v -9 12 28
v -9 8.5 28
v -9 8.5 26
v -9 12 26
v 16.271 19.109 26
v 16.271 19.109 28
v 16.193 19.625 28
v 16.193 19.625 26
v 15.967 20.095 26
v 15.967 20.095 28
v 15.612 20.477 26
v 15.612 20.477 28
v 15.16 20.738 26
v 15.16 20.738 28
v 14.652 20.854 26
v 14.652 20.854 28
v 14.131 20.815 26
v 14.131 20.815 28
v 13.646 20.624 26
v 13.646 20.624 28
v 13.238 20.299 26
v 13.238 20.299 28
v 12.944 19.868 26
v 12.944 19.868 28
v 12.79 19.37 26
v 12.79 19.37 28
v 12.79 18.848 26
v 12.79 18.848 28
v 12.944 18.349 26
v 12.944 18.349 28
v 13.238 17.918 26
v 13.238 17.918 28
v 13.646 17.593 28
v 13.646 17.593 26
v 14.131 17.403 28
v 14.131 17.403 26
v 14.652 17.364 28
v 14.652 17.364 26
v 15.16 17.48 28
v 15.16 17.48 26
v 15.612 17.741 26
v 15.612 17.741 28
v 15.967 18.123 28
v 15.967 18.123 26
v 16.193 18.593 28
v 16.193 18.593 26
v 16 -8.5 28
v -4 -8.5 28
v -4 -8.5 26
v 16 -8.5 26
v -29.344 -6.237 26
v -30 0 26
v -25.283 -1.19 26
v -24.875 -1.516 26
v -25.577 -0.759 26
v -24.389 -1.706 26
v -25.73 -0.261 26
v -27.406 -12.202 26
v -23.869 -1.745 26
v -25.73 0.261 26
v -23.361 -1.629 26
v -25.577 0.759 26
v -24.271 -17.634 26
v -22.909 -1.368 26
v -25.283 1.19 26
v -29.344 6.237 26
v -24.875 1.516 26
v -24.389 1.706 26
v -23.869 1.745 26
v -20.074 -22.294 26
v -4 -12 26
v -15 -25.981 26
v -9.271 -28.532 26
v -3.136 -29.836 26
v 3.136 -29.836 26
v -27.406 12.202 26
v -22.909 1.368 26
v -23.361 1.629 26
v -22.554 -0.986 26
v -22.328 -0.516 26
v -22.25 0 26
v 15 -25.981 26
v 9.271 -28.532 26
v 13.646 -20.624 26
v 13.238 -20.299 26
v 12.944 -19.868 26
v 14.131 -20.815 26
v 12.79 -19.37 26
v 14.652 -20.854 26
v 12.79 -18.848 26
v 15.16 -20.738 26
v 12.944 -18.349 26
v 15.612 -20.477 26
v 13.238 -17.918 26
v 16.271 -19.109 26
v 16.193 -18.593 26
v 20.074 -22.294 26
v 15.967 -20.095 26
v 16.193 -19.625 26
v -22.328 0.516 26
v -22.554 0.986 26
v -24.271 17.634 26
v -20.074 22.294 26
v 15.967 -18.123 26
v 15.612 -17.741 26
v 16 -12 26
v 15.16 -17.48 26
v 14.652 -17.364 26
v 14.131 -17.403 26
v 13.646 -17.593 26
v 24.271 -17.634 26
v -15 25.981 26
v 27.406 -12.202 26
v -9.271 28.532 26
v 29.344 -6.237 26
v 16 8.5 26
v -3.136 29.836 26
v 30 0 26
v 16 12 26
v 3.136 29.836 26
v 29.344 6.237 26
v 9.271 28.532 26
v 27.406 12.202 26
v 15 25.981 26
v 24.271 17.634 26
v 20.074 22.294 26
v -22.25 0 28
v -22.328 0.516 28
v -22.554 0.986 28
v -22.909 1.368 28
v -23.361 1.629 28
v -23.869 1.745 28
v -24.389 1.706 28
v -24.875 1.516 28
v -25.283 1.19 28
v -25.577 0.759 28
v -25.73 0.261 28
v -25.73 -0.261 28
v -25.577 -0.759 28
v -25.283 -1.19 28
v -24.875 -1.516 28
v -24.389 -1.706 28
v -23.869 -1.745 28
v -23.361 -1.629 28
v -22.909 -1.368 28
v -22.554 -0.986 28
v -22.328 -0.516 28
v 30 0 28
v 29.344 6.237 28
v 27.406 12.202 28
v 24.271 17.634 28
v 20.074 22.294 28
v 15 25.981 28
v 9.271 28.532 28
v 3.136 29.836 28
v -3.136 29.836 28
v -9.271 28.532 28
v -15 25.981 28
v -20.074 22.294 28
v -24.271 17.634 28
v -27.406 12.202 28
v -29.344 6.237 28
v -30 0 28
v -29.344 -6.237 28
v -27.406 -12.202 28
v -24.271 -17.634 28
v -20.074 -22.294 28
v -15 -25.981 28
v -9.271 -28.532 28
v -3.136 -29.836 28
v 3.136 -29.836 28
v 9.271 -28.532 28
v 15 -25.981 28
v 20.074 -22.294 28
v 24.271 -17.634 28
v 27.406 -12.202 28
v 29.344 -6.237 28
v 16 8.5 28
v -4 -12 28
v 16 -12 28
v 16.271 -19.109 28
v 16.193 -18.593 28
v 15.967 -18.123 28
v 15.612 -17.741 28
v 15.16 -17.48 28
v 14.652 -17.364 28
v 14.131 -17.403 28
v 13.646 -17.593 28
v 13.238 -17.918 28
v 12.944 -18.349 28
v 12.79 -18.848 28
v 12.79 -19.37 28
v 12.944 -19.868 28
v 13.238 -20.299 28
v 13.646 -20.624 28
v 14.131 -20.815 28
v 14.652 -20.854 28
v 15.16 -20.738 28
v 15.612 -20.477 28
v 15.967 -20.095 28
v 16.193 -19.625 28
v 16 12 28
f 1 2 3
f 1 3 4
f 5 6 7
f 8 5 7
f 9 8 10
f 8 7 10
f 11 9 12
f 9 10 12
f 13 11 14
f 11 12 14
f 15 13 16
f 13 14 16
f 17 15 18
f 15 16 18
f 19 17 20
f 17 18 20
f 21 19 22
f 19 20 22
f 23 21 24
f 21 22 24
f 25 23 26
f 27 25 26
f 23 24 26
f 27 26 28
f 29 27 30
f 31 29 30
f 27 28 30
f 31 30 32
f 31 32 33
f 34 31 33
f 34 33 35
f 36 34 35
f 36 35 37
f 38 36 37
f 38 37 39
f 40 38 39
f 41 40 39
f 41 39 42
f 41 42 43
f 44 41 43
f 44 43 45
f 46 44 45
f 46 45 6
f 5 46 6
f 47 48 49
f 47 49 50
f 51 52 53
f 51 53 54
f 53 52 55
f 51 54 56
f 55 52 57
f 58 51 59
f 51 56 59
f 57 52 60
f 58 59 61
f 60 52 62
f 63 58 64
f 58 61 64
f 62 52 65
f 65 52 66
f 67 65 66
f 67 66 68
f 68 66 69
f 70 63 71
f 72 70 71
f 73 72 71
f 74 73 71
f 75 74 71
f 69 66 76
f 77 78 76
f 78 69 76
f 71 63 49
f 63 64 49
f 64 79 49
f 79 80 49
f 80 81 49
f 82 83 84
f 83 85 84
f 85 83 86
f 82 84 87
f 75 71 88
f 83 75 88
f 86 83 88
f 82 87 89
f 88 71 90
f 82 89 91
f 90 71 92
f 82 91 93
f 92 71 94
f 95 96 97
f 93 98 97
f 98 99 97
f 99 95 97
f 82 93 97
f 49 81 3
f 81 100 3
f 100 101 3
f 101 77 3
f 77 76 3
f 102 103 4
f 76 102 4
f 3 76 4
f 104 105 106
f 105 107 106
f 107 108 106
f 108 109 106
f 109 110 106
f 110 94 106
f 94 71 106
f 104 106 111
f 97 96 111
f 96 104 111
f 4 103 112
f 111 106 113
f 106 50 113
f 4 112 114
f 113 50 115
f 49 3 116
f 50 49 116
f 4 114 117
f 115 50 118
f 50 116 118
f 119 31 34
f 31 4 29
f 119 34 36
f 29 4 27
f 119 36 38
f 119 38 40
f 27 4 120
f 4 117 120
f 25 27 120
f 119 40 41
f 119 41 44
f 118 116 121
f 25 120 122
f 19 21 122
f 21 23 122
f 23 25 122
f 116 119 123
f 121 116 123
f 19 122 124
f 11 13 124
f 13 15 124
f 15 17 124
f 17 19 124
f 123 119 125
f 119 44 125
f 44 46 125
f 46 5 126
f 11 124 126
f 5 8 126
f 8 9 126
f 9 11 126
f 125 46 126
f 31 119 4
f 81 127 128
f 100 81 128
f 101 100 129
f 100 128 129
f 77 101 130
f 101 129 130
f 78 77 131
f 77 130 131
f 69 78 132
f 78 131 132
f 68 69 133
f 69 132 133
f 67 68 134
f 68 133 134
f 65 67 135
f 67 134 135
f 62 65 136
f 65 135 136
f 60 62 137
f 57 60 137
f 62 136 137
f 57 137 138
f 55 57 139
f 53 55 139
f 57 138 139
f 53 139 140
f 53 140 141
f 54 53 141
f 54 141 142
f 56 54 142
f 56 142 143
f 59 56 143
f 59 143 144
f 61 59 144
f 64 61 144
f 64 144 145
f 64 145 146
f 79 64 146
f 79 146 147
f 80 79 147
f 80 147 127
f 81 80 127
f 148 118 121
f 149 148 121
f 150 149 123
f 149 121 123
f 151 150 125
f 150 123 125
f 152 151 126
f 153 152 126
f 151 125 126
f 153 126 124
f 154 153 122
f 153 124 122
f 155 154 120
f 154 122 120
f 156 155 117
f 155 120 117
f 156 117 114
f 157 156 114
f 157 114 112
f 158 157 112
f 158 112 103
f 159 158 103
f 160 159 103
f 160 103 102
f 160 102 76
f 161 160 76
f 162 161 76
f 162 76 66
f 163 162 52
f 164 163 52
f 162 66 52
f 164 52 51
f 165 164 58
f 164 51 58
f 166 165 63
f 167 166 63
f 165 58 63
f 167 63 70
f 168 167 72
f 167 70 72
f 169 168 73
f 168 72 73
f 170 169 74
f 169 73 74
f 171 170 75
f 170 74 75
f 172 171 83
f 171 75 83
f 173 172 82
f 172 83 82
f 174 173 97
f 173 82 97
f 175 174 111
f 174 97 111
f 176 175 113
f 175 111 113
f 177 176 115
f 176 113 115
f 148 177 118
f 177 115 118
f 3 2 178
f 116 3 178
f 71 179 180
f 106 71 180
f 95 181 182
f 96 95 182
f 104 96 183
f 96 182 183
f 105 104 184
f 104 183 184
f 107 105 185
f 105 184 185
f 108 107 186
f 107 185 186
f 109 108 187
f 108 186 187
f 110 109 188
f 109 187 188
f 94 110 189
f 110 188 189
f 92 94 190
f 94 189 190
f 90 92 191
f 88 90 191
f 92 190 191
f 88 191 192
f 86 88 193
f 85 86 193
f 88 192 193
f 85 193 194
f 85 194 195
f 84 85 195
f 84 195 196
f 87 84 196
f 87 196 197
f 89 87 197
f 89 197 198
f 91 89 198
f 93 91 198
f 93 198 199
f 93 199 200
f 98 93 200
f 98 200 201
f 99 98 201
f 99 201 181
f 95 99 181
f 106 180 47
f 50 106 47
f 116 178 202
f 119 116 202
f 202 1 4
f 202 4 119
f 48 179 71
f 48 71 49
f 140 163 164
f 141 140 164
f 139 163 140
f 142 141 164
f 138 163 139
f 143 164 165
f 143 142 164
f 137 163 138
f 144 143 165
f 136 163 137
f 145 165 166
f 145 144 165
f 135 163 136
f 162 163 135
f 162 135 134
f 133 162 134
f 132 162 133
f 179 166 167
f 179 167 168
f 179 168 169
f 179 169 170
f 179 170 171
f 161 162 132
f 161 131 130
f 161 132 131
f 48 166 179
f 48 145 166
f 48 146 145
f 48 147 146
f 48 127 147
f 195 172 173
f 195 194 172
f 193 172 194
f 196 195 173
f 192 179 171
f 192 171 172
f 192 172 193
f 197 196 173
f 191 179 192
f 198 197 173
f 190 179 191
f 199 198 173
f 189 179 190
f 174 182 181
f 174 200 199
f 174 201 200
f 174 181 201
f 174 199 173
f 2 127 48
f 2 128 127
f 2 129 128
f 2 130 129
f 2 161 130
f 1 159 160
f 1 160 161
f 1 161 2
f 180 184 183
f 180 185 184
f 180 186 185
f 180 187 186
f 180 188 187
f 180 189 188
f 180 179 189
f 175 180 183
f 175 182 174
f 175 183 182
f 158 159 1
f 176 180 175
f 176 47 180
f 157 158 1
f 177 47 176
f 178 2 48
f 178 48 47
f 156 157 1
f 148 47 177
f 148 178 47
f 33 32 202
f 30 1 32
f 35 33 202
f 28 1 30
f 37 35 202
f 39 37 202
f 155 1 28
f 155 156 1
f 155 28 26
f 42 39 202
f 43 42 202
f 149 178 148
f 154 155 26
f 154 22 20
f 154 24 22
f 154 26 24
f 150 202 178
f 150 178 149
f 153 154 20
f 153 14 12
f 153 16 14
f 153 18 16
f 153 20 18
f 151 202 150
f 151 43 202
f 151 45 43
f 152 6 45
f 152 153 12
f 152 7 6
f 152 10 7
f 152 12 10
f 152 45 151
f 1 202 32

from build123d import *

# Parameters (mm, degrees)
SKETCH003_R     = 30
PAD001_DEPTH    = 2
SKETCH012_R     = 1.75
POCKET005_DEPTH = 5
SKETCH024_W     = 25
SKETCH024_H     = 3.5
SKETCH024_W_2   = 20
POCKET016_DEPTH = 5


with BuildPart() as part:
    # Sketch003 → Pad001 (new body)
    with BuildSketch(Plane.XY):
        Circle(SKETCH003_R)
    extrude(amount=PAD001_DEPTH)

    # Sketch012 (on Face3 of Pad001) → Pocket005 (cut)
    with BuildSketch(Plane.XY.offset(2)):
        with Locations((14.520833, 19.108778)):
            Circle(SKETCH012_R)
        with Locations((-24, 0)):
            Circle(SKETCH012_R)
        with Locations((14.520833, -19.108778)):
            Circle(SKETCH012_R)
    extrude(amount=-POCKET005_DEPTH, mode=Mode.SUBTRACT)

    # Sketch024 (on Face3 of Pocket005) → Pocket016 (cut)
    with BuildSketch(Plane.XY.offset(2)):
        with Locations((3.5, 10.25)):
            Rectangle(SKETCH024_W, SKETCH024_H)
        with Locations((6, -10.25)):
            Rectangle(SKETCH024_W_2, SKETCH024_H)
    extrude(amount=-POCKET016_DEPTH, mode=Mode.SUBTRACT)


with BuildPart() as part_1:
    # Body001 placement: moved
    add(part.part.moved(Location((0, 0, 26))))


solid = part_1.part
